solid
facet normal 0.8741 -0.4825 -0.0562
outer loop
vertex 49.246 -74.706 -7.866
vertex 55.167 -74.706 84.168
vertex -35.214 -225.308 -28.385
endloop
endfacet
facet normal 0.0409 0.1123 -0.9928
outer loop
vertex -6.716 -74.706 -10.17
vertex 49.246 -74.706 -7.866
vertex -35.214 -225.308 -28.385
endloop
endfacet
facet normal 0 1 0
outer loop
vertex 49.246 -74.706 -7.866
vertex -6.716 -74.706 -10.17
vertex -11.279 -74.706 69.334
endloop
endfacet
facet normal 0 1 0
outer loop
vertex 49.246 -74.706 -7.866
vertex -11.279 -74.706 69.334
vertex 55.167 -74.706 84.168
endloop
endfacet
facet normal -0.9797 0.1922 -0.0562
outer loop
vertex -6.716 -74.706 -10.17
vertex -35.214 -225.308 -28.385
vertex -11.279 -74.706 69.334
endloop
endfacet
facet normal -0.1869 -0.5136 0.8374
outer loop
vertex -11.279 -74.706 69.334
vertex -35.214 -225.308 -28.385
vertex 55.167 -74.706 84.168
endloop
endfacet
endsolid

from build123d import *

# Parameters (mm, degrees)
F0_W     = 100
F0_H     = 140
F1_DEPTH = 300
F4_DEPTH = 140.001
F5_DEPTH = 100.001
F6_ANGLE = 20
F7_ANGLE = 20
F8_W     = 212.240686353
F8_H     = 198.875214911
F9_DEPTH = 142


with BuildPart() as f1:
    # F0 (on Front) → F1 (new body)
    with BuildSketch(Plane.XZ):
        with Locations((50, 70)):
            Rectangle(F0_W, F0_H)
    extrude(amount=F1_DEPTH)

    # F2 (on face) → F4 (cut, through all)
    with BuildSketch(Plane.XY.offset(140)):
        Polygon((50, -300), (0, 0), (-43.4896158054, -321.4669823647), (163.4580759332, -380.9873461723), (100, 0), align=None)
    extrude(amount=-F4_DEPTH, mode=Mode.SUBTRACT)

    # F3 (on face) → F5 (cut, through all)
    with BuildSketch(Plane.YZ.offset(100)):
        Polygon((-300, 70), (0, 140), (-333.8288962841, 174.1326918269), (-333.8288962841, -23.4987252064), (0, 0), align=None)
    extrude(amount=-F5_DEPTH, mode=Mode.SUBTRACT)


with BuildPart() as f1_1:
    # F6: moved
    add(f1.part.rotate(Axis((100, 0, 70), (0, 0, -1)), F6_ANGLE))


with BuildPart() as f1_2:
    # F7: moved
    add(f1_1.part.rotate(Axis((53.0153689607, 17.1010071663, 140), (0.9396926208, -0.3420201433, 0)), F7_ANGLE))

    # F8 (on Top) → F9 (cut, symmetric)
    with BuildSketch(Plane.XY):
        with Locations((27.6002858933, 24.7314047101)):
            Rectangle(F8_W, F8_H)
    extrude(amount=F9_DEPTH, both=True, mode=Mode.SUBTRACT)


solid = f1_2.part
